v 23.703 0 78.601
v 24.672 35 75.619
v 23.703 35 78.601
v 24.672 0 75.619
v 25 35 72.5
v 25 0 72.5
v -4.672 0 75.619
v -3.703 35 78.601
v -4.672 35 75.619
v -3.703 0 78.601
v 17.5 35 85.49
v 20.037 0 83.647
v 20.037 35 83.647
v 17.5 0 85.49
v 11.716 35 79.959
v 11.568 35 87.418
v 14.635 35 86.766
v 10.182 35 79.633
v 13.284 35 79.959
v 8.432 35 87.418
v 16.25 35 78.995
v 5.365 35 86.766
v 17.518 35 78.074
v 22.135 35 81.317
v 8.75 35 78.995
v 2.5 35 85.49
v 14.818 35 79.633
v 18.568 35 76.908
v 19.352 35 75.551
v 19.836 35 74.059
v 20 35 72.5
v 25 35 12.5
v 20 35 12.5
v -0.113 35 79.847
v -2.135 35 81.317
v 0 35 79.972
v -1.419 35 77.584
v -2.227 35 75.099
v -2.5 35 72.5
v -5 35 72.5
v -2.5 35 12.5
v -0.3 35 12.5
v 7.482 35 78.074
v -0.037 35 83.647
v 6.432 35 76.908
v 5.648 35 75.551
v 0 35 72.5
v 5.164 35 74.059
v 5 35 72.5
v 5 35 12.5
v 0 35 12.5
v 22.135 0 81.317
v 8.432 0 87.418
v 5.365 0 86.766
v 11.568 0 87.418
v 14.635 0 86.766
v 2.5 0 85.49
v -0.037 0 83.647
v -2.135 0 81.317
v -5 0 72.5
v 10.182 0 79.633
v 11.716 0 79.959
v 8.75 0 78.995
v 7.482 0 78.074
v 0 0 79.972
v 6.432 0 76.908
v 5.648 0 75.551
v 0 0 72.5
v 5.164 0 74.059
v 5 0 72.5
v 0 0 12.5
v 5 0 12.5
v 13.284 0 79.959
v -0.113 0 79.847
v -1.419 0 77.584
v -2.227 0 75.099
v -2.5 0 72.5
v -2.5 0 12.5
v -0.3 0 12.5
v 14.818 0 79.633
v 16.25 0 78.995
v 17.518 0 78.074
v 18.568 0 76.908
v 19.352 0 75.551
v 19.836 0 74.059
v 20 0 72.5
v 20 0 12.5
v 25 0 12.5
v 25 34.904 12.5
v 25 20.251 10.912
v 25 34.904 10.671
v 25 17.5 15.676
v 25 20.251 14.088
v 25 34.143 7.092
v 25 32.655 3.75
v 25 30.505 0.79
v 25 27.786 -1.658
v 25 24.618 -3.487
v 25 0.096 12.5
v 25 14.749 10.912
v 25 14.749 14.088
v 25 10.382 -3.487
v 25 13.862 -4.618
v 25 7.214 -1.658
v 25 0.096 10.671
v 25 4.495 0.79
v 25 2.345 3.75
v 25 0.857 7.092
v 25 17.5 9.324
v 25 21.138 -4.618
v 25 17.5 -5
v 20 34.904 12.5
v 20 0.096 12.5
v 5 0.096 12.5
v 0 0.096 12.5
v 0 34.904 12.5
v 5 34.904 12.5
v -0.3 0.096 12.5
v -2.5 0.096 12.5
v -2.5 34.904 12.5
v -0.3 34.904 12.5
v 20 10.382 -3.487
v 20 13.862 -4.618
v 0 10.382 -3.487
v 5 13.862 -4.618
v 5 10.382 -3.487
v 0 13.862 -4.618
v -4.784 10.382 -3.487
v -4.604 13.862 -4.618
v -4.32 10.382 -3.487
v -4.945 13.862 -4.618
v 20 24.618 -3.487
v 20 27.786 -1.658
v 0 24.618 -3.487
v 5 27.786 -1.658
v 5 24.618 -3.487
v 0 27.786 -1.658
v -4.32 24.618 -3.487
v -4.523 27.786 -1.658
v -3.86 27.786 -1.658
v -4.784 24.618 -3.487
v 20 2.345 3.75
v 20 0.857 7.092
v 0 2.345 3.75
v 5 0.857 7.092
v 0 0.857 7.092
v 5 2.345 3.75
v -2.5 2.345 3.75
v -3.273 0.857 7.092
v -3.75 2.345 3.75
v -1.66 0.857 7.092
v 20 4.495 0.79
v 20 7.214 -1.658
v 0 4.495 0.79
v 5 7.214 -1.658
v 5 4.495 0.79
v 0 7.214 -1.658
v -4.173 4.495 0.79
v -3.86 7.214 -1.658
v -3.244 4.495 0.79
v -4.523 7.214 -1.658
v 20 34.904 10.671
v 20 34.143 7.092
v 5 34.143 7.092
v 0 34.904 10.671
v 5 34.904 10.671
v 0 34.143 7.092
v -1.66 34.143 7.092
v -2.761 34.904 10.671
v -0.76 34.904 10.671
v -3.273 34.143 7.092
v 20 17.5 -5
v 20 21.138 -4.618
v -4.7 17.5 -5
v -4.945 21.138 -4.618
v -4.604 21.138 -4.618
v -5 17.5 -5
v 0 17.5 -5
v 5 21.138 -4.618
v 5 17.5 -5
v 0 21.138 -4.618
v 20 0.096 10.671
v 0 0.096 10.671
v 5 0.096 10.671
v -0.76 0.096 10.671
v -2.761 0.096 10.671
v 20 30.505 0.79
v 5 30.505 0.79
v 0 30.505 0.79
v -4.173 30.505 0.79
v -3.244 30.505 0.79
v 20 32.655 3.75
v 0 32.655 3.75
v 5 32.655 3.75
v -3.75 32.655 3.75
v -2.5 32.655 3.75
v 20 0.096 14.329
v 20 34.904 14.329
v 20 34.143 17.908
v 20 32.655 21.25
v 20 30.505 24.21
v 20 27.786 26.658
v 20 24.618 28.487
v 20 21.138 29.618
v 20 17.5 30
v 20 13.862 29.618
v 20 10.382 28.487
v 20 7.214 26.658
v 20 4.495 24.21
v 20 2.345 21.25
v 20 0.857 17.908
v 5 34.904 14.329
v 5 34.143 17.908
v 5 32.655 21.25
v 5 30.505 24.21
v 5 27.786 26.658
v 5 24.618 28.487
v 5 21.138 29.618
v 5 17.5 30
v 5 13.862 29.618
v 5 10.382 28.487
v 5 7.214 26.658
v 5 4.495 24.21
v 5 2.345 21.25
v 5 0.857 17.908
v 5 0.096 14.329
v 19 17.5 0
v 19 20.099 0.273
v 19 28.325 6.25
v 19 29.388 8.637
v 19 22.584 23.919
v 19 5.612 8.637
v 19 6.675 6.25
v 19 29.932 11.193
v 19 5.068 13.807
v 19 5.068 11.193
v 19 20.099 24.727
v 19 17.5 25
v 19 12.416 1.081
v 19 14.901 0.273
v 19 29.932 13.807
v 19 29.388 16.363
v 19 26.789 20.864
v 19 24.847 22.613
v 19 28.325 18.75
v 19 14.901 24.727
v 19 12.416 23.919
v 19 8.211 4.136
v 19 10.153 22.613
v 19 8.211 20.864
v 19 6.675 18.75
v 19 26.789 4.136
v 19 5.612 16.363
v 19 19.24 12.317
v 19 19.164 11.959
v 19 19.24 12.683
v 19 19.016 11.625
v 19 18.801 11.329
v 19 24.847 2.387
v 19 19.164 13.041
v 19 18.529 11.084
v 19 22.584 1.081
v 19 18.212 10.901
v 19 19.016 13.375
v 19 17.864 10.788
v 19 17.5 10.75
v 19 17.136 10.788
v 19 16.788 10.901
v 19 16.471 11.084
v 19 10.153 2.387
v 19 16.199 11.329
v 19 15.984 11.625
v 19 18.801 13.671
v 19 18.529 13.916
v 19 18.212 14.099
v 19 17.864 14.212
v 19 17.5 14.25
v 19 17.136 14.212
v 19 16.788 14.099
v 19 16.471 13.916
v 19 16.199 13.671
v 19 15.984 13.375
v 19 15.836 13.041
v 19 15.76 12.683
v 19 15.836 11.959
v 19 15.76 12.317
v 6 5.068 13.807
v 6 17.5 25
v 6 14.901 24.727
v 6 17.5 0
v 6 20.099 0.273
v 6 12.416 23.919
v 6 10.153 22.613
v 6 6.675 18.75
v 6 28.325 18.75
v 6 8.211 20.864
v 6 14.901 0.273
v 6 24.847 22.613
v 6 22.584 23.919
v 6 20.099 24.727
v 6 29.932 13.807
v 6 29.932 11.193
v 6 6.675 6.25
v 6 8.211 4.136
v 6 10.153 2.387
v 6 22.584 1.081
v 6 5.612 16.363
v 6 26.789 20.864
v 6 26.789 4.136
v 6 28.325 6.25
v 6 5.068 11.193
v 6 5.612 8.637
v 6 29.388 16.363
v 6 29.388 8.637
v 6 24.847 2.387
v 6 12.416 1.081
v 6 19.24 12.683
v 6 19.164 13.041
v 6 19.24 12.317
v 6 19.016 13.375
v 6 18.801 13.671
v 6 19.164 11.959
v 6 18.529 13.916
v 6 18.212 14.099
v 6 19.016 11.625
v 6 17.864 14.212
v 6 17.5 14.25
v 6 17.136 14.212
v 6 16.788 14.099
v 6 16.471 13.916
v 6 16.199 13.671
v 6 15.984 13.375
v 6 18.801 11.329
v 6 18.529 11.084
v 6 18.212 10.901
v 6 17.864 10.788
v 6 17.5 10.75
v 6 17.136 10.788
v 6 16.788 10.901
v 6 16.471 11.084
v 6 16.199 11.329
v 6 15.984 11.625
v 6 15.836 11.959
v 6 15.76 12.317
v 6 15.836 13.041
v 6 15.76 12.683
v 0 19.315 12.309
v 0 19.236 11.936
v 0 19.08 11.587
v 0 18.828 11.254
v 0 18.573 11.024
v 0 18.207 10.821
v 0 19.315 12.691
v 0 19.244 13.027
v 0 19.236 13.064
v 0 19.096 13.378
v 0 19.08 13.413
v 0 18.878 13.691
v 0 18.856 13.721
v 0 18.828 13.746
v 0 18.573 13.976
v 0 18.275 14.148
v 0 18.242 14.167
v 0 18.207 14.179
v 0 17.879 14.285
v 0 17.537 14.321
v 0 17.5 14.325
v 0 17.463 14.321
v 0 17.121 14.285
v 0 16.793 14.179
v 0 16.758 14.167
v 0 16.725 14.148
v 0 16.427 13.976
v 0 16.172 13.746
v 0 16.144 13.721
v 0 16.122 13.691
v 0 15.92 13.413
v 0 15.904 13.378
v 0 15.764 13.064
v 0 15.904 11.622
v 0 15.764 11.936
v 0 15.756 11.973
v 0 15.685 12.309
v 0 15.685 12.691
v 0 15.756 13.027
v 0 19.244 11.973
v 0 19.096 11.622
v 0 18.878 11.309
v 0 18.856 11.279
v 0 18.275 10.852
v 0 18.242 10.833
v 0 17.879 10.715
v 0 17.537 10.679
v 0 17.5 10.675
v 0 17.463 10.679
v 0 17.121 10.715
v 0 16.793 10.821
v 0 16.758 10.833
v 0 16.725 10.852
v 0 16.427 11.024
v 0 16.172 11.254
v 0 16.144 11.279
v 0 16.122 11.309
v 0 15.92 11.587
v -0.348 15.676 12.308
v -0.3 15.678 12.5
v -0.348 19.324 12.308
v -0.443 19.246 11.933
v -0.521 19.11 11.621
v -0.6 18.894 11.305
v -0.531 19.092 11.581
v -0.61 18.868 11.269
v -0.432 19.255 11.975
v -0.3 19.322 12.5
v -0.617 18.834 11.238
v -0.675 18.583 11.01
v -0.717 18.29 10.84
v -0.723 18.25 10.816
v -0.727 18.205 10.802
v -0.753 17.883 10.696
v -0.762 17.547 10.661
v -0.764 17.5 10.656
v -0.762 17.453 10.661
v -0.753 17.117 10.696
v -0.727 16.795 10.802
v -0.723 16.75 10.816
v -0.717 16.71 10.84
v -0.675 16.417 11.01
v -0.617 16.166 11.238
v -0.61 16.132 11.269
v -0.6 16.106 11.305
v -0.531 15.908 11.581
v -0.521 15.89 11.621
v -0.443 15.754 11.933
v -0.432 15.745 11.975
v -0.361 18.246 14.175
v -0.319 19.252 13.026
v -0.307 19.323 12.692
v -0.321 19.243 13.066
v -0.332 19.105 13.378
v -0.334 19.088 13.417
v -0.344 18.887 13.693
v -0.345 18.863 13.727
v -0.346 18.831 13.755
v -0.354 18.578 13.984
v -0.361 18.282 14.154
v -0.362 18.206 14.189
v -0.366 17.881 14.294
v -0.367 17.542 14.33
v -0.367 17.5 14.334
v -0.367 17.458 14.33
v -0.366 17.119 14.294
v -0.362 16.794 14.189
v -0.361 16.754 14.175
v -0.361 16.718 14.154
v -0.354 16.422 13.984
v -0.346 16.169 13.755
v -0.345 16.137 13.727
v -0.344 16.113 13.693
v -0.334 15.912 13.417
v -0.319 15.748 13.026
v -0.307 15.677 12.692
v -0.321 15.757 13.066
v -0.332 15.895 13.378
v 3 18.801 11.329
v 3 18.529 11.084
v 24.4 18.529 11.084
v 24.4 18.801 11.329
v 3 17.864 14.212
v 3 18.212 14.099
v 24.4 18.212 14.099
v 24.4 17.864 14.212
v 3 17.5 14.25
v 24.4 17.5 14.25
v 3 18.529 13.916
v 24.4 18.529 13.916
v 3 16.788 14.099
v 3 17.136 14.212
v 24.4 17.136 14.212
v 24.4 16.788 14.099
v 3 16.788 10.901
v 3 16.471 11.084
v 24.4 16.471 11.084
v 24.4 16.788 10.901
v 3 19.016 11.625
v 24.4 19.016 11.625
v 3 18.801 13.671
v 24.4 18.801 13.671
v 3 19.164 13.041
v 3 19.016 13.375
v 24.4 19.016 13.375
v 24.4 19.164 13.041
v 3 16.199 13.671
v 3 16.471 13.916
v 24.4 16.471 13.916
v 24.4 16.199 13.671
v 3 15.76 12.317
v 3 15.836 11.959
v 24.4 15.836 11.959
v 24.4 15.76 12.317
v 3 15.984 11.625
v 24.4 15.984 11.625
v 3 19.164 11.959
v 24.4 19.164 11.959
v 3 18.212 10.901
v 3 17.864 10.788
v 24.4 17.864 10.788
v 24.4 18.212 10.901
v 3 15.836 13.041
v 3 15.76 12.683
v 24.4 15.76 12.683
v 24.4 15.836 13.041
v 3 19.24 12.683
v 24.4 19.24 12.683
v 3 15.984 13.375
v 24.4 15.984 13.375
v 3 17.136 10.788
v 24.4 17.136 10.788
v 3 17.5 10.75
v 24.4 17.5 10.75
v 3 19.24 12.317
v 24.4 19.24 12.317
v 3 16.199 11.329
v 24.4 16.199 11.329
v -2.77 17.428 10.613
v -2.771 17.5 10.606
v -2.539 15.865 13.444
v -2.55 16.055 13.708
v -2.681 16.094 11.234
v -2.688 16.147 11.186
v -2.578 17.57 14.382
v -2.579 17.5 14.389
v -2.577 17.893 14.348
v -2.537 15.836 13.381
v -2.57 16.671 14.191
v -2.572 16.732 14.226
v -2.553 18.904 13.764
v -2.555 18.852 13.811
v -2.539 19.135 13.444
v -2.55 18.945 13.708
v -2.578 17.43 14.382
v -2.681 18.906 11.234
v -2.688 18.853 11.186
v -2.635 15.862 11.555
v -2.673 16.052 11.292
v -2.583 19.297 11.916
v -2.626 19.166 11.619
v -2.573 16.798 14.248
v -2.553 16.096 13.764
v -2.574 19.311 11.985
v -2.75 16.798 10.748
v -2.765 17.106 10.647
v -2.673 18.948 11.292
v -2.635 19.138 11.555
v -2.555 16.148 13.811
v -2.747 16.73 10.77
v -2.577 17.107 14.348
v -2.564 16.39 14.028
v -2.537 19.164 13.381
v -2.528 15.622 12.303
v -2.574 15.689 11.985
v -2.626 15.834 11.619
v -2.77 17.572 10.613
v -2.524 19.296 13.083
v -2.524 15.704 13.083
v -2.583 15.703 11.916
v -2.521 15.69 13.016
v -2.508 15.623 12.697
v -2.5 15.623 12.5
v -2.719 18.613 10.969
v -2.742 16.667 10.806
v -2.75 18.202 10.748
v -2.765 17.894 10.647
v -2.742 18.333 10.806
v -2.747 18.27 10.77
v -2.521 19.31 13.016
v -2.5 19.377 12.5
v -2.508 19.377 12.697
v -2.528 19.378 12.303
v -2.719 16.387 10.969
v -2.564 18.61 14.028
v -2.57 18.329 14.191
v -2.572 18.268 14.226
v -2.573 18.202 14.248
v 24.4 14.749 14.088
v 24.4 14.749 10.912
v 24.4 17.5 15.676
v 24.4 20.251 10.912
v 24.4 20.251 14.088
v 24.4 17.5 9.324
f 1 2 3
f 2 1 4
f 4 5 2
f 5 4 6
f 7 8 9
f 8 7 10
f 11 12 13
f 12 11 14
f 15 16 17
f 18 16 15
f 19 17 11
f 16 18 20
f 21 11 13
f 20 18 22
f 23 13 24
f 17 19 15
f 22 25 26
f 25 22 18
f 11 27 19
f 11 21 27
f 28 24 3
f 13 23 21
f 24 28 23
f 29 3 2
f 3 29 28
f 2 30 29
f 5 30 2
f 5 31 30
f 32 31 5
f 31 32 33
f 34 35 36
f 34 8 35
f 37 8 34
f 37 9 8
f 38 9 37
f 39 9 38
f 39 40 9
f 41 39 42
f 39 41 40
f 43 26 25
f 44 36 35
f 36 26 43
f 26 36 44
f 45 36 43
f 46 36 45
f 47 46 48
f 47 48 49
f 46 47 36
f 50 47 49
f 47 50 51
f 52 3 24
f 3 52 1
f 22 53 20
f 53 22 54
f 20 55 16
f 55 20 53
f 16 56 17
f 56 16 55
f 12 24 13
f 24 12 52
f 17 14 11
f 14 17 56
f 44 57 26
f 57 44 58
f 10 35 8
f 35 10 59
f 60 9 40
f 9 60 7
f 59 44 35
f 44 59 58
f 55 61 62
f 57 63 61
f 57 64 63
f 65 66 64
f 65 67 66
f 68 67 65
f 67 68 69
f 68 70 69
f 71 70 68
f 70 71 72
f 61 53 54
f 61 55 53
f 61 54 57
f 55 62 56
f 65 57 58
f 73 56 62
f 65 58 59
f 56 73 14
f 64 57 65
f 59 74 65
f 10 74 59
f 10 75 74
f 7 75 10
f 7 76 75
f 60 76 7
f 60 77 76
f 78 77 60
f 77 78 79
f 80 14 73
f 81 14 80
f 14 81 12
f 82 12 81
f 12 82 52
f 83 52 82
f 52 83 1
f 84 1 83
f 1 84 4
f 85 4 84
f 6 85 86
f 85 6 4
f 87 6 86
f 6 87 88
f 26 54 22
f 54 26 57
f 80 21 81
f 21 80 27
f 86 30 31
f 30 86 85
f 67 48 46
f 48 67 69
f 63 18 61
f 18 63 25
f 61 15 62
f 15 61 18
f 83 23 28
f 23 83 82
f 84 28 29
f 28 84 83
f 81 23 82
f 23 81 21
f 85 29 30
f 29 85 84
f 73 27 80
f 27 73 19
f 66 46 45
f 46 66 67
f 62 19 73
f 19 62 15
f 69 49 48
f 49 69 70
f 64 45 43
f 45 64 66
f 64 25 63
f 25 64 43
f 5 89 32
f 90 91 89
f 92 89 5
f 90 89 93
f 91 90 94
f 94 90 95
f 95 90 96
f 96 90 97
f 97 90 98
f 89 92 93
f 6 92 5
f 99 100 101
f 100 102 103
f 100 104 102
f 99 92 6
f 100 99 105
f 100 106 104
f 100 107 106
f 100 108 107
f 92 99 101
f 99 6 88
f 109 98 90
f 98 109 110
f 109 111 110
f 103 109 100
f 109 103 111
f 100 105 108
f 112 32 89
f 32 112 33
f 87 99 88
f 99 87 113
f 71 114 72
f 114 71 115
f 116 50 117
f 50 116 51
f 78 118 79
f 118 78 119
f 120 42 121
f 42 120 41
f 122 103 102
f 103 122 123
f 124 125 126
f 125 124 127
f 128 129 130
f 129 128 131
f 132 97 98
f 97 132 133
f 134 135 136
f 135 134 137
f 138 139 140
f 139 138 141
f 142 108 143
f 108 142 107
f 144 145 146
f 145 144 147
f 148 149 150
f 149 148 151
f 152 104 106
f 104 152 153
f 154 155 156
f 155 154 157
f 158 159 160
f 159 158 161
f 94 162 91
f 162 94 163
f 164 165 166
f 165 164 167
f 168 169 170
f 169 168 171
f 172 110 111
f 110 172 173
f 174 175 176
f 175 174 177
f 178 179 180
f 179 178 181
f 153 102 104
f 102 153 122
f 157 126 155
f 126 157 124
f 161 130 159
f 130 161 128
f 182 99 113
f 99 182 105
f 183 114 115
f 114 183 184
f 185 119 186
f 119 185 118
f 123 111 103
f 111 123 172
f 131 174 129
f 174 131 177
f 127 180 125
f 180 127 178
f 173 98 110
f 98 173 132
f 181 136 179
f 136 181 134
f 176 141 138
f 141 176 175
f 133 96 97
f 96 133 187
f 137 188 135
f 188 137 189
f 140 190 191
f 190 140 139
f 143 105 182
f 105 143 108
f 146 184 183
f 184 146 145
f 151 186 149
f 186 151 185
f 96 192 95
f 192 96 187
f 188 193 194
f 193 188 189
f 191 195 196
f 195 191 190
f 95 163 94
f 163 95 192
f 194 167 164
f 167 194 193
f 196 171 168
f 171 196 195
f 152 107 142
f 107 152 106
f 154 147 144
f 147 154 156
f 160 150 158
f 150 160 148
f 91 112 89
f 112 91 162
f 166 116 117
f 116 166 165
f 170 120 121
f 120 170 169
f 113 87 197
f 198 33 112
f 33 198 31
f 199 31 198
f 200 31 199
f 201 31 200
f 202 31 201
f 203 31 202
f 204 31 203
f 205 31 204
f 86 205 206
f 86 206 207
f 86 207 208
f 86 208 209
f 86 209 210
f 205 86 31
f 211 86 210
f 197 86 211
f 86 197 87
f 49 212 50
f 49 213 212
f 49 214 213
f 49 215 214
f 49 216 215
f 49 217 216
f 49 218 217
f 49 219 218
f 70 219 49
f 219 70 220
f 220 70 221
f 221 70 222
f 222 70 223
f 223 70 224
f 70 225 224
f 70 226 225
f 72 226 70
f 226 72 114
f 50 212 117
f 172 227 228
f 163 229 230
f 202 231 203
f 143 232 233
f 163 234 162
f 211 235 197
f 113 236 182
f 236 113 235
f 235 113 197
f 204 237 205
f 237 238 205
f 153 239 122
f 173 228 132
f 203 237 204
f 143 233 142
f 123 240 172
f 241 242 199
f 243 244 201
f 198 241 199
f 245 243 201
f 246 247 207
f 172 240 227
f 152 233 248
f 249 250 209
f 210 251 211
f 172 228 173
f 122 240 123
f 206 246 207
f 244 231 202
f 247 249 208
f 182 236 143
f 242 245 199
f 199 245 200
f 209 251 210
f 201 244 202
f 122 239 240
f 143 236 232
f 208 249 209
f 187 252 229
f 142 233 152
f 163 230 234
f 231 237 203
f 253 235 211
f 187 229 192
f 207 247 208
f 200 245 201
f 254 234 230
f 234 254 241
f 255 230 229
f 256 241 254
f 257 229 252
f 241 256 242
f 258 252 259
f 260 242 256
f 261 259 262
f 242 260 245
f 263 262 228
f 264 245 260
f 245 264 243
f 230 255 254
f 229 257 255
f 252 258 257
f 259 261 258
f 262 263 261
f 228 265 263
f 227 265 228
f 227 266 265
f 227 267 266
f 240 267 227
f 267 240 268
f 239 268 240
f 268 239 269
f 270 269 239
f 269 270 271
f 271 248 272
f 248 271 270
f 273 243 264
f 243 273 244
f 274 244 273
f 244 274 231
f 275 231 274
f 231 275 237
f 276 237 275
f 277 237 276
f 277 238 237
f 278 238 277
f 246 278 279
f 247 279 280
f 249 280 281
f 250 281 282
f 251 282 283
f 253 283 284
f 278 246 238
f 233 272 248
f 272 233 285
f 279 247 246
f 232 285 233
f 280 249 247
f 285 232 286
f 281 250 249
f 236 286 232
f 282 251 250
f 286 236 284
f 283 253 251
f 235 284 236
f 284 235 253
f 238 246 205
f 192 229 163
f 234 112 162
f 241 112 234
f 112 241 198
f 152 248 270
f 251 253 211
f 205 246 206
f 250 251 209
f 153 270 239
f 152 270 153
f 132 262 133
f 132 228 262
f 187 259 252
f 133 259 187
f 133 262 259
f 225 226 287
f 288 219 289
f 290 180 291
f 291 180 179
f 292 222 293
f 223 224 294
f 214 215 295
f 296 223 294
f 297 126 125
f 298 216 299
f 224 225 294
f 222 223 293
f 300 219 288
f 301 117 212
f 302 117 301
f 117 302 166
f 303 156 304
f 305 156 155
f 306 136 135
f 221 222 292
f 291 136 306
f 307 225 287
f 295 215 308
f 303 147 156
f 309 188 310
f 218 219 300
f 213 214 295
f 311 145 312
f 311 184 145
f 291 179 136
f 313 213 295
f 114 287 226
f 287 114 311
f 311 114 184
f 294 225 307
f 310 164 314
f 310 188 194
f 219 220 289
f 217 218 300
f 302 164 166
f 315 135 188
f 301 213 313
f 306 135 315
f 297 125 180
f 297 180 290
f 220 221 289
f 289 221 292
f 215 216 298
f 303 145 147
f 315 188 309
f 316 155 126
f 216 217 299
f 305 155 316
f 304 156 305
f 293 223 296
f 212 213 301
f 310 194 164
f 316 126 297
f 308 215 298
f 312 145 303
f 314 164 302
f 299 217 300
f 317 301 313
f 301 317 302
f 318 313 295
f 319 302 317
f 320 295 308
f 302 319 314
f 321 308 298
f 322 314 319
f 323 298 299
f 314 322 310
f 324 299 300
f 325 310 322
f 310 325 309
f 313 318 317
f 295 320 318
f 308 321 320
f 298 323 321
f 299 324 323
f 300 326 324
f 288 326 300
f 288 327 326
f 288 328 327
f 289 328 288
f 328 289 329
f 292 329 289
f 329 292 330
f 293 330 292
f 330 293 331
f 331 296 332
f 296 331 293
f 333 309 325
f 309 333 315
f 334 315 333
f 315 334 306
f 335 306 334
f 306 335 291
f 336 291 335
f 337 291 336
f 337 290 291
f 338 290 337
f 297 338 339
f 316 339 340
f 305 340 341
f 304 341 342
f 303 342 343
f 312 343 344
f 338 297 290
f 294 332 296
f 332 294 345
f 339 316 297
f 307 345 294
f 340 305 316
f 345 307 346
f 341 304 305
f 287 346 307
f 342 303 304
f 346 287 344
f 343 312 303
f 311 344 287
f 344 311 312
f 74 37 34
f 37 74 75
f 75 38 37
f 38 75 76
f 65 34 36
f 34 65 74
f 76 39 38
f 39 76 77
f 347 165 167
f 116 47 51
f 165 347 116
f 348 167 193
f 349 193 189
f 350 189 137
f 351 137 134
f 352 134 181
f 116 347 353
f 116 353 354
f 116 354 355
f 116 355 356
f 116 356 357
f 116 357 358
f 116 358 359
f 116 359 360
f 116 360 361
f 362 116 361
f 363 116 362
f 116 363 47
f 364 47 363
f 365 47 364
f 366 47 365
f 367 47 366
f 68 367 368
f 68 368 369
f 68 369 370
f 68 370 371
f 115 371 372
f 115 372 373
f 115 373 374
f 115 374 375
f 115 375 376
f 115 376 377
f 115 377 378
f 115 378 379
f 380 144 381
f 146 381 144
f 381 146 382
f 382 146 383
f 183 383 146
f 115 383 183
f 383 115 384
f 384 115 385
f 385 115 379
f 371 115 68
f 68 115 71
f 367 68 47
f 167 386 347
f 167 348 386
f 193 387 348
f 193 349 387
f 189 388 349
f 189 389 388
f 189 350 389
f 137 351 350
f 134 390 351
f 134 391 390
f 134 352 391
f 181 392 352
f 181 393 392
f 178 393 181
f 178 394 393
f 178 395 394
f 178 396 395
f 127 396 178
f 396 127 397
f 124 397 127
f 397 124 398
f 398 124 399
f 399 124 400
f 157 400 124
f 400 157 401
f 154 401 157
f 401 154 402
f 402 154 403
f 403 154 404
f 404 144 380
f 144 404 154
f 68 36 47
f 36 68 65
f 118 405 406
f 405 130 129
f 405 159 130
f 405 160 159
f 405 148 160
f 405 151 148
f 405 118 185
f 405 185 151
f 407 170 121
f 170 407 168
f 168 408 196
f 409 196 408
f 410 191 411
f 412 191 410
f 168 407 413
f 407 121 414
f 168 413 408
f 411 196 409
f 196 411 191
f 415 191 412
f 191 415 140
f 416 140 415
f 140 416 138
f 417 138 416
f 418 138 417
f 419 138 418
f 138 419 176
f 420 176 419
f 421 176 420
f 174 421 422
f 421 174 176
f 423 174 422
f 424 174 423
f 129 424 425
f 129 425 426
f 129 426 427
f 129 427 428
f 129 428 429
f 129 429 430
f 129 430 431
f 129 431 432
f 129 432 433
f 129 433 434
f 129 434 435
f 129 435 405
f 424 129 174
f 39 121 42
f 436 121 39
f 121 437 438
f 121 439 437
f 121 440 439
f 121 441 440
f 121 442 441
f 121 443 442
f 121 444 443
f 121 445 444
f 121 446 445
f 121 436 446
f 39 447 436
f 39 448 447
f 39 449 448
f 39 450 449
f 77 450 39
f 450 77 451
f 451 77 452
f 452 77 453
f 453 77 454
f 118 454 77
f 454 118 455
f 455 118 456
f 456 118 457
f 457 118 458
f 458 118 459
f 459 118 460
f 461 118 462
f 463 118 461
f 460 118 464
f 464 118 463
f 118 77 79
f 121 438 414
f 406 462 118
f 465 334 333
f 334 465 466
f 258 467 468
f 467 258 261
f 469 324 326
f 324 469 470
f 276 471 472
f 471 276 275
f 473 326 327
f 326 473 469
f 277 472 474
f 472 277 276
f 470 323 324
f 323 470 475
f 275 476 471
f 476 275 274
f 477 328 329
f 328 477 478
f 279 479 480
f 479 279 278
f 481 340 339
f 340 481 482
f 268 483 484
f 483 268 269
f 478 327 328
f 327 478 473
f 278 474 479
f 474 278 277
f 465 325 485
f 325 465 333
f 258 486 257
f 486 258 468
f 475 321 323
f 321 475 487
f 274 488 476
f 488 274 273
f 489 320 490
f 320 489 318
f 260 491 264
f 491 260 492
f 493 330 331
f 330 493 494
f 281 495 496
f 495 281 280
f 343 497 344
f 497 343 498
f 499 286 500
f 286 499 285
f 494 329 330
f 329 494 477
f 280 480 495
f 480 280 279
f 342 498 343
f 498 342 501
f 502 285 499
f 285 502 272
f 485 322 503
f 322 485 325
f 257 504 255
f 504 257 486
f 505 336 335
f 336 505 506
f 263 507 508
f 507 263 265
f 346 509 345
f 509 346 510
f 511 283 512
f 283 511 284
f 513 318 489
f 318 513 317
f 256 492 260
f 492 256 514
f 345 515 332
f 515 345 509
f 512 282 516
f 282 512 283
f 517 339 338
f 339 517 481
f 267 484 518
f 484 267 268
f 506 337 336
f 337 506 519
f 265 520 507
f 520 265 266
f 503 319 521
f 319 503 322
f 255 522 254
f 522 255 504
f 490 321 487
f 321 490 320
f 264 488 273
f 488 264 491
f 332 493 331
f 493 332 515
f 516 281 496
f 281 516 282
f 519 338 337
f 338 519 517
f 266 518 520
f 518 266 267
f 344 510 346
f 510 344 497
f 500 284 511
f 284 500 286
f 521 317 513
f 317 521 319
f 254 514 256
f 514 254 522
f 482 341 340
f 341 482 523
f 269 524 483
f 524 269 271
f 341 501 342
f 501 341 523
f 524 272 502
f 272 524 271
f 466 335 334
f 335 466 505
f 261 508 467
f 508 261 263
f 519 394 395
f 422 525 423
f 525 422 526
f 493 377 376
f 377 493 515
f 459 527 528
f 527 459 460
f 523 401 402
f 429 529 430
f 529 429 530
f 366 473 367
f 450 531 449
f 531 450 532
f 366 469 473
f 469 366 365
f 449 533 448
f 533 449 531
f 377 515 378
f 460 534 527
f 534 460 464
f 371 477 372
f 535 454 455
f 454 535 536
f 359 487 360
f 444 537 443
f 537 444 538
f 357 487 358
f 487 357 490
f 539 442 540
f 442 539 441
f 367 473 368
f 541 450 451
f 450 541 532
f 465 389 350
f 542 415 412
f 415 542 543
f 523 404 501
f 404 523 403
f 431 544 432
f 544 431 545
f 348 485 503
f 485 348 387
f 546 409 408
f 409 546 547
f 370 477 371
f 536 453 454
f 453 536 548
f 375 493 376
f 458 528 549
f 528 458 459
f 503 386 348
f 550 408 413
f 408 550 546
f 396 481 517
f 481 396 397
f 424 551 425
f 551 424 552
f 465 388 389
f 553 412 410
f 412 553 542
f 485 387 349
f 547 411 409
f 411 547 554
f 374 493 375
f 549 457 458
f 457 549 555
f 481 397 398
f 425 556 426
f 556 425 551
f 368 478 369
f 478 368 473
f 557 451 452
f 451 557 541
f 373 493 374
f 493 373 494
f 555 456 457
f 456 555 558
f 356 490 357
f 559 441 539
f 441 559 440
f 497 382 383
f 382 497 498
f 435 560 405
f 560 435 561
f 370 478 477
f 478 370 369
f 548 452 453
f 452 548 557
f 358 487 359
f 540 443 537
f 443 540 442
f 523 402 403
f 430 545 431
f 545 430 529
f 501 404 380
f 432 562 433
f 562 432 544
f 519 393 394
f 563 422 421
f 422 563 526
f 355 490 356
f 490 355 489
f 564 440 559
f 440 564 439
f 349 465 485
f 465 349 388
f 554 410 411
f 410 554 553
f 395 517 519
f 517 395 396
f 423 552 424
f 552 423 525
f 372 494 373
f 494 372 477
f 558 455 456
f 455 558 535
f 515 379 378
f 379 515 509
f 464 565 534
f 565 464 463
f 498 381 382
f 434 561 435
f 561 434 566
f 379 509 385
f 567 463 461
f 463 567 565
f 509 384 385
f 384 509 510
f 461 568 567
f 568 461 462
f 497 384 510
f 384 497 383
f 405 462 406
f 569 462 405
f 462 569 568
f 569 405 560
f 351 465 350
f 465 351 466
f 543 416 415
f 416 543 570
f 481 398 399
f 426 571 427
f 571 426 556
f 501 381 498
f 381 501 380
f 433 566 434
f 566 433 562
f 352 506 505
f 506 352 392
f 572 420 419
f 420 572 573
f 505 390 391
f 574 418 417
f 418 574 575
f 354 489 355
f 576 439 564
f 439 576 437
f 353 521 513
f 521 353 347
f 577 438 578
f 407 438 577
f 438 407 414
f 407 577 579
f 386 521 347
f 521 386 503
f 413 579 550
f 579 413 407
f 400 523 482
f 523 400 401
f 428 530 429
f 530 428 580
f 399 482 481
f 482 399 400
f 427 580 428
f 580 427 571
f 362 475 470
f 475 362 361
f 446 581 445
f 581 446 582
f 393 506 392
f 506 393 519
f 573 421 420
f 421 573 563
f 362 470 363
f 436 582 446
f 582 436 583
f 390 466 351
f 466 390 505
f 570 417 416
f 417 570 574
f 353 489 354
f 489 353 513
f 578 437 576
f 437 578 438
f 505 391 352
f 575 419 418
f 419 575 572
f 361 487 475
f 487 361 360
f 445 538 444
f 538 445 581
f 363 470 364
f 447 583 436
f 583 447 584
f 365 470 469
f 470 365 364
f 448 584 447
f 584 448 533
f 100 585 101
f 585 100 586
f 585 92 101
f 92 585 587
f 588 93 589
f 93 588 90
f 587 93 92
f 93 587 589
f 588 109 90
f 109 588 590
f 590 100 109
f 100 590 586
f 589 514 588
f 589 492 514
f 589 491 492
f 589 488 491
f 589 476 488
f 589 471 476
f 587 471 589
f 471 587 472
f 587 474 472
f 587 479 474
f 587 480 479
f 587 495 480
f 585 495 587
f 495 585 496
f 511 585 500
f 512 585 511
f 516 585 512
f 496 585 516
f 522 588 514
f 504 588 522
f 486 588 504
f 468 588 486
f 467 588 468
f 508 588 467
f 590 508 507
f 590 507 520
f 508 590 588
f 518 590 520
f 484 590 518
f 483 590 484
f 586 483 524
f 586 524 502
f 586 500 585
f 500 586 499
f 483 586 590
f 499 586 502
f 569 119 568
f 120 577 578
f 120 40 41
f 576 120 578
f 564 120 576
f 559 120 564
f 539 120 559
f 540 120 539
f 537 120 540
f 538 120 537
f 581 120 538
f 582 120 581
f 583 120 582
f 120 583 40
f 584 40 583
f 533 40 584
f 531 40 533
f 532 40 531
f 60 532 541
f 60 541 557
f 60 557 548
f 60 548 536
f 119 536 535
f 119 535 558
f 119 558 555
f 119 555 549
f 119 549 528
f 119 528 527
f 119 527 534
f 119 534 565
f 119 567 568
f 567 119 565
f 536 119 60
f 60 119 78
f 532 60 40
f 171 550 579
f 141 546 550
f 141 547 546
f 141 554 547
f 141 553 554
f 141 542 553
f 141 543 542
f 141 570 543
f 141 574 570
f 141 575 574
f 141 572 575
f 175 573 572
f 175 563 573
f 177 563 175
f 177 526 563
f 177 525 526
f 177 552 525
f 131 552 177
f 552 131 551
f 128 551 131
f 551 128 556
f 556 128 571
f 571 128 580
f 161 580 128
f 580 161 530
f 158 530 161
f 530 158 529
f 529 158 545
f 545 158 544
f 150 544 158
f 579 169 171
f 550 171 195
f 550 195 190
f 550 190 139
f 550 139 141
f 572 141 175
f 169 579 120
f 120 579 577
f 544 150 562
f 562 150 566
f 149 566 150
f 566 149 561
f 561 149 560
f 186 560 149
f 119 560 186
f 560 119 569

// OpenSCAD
// file: Porca.scad
module porca(s,m){
    /*
   http://www.inoxpar.com.br/img/gallerypage/PORCA_SEXTAVADA_DIN_934.jpg https://br.answers.yahoo.com/question/index?qid=20110425054004AA0B8bn*/
cylinder(h=m,d=s*1.155,$fn=6);
}
// file: Parafuso.scad
module parafuso(diametro,altura,diametro_cabeca,altura_cabeca){
$fs=0.04; 
union(){
cylinder(h=altura,d=diametro);
translate([0,0,altura])cylinder(h=altura_cabeca,d2=diametro_cabeca,d1=diametro);
}
}
// main file
use <Parafuso.scad>
use <Porca.scad>
$fs=0.4;
espessura=5+4; /*espessura das chaves*/
text=25;
tint=15;
chave_maior=72.5;
difference(){
union(){
translate([0,0,25/2])cube([text,35,chave_maior-25/2]);
translate([0,35/2,25/2])rotate([0,90,0])cylinder(d=35,h=text);
translate([-5,0,25/2])cube([5,35,chave_maior-25/2]);
translate([-5,35/2,25/2])rotate([0,90,0])cylinder(d=35,h=5);   
translate([text/2,0,chave_maior])rotate([-90,0,0]){
    difference(){
    translate([-2.5,0,0])cylinder(d=text+5,h=35);
    cylinder(d=tint,h=35);
    }
}
}
difference(){
    translate([(text-tint)/2,0,-15])cube([tint,40,chave_maior+15]);
    translate([text-5-1,35/2,25/2])rotate([0,90,0])cylinder(d2=35,d1=25,h=1);
    translate([5,35/2,25/2])rotate([0,90,0])cylinder(d1=35,d2=25,h=1);
}

union(){
translate([0,38,0])rotate([90,0,0])linear_extrude(height = 40)polygon(points=[[-5+.3,-5],[0,-5],[0,25/2],[-.3,25/2]]);

difference(){
translate([text/2-2.5,-5,chave_maior])rotate([-90,0,0])cylinder(d=text,h=45);
    translate([0,-20,])cube([50,70,100]);
}

#translate([0,36,0])rotate([90,0,0])linear_extrude(height = 40)polygon(
        points=[[-.3,25/2],[0,25/2],[0,72.5],[-2.5,72.5]]
    );
}
translate([0,35,0])rotate([90,0,0])linear_extrude(height = 40)polygon(
        points=[[-5,72.5],[-2.5,25/2],[-5,-5],[-25,-5]]
    );

translate([text,35/2,25/2])rotate([0,-90,0]){
parafuso(3.5,text-3,6,50);
translate([0,0,-1])porca(5.5,2.6-1);
}
}

/*
difference(){
translate([text/2-2.5,0,chave_maior])rotate([-90,0,0])cylinder(d=text,h=35);
    cube([500,500,500]);
}
*/
